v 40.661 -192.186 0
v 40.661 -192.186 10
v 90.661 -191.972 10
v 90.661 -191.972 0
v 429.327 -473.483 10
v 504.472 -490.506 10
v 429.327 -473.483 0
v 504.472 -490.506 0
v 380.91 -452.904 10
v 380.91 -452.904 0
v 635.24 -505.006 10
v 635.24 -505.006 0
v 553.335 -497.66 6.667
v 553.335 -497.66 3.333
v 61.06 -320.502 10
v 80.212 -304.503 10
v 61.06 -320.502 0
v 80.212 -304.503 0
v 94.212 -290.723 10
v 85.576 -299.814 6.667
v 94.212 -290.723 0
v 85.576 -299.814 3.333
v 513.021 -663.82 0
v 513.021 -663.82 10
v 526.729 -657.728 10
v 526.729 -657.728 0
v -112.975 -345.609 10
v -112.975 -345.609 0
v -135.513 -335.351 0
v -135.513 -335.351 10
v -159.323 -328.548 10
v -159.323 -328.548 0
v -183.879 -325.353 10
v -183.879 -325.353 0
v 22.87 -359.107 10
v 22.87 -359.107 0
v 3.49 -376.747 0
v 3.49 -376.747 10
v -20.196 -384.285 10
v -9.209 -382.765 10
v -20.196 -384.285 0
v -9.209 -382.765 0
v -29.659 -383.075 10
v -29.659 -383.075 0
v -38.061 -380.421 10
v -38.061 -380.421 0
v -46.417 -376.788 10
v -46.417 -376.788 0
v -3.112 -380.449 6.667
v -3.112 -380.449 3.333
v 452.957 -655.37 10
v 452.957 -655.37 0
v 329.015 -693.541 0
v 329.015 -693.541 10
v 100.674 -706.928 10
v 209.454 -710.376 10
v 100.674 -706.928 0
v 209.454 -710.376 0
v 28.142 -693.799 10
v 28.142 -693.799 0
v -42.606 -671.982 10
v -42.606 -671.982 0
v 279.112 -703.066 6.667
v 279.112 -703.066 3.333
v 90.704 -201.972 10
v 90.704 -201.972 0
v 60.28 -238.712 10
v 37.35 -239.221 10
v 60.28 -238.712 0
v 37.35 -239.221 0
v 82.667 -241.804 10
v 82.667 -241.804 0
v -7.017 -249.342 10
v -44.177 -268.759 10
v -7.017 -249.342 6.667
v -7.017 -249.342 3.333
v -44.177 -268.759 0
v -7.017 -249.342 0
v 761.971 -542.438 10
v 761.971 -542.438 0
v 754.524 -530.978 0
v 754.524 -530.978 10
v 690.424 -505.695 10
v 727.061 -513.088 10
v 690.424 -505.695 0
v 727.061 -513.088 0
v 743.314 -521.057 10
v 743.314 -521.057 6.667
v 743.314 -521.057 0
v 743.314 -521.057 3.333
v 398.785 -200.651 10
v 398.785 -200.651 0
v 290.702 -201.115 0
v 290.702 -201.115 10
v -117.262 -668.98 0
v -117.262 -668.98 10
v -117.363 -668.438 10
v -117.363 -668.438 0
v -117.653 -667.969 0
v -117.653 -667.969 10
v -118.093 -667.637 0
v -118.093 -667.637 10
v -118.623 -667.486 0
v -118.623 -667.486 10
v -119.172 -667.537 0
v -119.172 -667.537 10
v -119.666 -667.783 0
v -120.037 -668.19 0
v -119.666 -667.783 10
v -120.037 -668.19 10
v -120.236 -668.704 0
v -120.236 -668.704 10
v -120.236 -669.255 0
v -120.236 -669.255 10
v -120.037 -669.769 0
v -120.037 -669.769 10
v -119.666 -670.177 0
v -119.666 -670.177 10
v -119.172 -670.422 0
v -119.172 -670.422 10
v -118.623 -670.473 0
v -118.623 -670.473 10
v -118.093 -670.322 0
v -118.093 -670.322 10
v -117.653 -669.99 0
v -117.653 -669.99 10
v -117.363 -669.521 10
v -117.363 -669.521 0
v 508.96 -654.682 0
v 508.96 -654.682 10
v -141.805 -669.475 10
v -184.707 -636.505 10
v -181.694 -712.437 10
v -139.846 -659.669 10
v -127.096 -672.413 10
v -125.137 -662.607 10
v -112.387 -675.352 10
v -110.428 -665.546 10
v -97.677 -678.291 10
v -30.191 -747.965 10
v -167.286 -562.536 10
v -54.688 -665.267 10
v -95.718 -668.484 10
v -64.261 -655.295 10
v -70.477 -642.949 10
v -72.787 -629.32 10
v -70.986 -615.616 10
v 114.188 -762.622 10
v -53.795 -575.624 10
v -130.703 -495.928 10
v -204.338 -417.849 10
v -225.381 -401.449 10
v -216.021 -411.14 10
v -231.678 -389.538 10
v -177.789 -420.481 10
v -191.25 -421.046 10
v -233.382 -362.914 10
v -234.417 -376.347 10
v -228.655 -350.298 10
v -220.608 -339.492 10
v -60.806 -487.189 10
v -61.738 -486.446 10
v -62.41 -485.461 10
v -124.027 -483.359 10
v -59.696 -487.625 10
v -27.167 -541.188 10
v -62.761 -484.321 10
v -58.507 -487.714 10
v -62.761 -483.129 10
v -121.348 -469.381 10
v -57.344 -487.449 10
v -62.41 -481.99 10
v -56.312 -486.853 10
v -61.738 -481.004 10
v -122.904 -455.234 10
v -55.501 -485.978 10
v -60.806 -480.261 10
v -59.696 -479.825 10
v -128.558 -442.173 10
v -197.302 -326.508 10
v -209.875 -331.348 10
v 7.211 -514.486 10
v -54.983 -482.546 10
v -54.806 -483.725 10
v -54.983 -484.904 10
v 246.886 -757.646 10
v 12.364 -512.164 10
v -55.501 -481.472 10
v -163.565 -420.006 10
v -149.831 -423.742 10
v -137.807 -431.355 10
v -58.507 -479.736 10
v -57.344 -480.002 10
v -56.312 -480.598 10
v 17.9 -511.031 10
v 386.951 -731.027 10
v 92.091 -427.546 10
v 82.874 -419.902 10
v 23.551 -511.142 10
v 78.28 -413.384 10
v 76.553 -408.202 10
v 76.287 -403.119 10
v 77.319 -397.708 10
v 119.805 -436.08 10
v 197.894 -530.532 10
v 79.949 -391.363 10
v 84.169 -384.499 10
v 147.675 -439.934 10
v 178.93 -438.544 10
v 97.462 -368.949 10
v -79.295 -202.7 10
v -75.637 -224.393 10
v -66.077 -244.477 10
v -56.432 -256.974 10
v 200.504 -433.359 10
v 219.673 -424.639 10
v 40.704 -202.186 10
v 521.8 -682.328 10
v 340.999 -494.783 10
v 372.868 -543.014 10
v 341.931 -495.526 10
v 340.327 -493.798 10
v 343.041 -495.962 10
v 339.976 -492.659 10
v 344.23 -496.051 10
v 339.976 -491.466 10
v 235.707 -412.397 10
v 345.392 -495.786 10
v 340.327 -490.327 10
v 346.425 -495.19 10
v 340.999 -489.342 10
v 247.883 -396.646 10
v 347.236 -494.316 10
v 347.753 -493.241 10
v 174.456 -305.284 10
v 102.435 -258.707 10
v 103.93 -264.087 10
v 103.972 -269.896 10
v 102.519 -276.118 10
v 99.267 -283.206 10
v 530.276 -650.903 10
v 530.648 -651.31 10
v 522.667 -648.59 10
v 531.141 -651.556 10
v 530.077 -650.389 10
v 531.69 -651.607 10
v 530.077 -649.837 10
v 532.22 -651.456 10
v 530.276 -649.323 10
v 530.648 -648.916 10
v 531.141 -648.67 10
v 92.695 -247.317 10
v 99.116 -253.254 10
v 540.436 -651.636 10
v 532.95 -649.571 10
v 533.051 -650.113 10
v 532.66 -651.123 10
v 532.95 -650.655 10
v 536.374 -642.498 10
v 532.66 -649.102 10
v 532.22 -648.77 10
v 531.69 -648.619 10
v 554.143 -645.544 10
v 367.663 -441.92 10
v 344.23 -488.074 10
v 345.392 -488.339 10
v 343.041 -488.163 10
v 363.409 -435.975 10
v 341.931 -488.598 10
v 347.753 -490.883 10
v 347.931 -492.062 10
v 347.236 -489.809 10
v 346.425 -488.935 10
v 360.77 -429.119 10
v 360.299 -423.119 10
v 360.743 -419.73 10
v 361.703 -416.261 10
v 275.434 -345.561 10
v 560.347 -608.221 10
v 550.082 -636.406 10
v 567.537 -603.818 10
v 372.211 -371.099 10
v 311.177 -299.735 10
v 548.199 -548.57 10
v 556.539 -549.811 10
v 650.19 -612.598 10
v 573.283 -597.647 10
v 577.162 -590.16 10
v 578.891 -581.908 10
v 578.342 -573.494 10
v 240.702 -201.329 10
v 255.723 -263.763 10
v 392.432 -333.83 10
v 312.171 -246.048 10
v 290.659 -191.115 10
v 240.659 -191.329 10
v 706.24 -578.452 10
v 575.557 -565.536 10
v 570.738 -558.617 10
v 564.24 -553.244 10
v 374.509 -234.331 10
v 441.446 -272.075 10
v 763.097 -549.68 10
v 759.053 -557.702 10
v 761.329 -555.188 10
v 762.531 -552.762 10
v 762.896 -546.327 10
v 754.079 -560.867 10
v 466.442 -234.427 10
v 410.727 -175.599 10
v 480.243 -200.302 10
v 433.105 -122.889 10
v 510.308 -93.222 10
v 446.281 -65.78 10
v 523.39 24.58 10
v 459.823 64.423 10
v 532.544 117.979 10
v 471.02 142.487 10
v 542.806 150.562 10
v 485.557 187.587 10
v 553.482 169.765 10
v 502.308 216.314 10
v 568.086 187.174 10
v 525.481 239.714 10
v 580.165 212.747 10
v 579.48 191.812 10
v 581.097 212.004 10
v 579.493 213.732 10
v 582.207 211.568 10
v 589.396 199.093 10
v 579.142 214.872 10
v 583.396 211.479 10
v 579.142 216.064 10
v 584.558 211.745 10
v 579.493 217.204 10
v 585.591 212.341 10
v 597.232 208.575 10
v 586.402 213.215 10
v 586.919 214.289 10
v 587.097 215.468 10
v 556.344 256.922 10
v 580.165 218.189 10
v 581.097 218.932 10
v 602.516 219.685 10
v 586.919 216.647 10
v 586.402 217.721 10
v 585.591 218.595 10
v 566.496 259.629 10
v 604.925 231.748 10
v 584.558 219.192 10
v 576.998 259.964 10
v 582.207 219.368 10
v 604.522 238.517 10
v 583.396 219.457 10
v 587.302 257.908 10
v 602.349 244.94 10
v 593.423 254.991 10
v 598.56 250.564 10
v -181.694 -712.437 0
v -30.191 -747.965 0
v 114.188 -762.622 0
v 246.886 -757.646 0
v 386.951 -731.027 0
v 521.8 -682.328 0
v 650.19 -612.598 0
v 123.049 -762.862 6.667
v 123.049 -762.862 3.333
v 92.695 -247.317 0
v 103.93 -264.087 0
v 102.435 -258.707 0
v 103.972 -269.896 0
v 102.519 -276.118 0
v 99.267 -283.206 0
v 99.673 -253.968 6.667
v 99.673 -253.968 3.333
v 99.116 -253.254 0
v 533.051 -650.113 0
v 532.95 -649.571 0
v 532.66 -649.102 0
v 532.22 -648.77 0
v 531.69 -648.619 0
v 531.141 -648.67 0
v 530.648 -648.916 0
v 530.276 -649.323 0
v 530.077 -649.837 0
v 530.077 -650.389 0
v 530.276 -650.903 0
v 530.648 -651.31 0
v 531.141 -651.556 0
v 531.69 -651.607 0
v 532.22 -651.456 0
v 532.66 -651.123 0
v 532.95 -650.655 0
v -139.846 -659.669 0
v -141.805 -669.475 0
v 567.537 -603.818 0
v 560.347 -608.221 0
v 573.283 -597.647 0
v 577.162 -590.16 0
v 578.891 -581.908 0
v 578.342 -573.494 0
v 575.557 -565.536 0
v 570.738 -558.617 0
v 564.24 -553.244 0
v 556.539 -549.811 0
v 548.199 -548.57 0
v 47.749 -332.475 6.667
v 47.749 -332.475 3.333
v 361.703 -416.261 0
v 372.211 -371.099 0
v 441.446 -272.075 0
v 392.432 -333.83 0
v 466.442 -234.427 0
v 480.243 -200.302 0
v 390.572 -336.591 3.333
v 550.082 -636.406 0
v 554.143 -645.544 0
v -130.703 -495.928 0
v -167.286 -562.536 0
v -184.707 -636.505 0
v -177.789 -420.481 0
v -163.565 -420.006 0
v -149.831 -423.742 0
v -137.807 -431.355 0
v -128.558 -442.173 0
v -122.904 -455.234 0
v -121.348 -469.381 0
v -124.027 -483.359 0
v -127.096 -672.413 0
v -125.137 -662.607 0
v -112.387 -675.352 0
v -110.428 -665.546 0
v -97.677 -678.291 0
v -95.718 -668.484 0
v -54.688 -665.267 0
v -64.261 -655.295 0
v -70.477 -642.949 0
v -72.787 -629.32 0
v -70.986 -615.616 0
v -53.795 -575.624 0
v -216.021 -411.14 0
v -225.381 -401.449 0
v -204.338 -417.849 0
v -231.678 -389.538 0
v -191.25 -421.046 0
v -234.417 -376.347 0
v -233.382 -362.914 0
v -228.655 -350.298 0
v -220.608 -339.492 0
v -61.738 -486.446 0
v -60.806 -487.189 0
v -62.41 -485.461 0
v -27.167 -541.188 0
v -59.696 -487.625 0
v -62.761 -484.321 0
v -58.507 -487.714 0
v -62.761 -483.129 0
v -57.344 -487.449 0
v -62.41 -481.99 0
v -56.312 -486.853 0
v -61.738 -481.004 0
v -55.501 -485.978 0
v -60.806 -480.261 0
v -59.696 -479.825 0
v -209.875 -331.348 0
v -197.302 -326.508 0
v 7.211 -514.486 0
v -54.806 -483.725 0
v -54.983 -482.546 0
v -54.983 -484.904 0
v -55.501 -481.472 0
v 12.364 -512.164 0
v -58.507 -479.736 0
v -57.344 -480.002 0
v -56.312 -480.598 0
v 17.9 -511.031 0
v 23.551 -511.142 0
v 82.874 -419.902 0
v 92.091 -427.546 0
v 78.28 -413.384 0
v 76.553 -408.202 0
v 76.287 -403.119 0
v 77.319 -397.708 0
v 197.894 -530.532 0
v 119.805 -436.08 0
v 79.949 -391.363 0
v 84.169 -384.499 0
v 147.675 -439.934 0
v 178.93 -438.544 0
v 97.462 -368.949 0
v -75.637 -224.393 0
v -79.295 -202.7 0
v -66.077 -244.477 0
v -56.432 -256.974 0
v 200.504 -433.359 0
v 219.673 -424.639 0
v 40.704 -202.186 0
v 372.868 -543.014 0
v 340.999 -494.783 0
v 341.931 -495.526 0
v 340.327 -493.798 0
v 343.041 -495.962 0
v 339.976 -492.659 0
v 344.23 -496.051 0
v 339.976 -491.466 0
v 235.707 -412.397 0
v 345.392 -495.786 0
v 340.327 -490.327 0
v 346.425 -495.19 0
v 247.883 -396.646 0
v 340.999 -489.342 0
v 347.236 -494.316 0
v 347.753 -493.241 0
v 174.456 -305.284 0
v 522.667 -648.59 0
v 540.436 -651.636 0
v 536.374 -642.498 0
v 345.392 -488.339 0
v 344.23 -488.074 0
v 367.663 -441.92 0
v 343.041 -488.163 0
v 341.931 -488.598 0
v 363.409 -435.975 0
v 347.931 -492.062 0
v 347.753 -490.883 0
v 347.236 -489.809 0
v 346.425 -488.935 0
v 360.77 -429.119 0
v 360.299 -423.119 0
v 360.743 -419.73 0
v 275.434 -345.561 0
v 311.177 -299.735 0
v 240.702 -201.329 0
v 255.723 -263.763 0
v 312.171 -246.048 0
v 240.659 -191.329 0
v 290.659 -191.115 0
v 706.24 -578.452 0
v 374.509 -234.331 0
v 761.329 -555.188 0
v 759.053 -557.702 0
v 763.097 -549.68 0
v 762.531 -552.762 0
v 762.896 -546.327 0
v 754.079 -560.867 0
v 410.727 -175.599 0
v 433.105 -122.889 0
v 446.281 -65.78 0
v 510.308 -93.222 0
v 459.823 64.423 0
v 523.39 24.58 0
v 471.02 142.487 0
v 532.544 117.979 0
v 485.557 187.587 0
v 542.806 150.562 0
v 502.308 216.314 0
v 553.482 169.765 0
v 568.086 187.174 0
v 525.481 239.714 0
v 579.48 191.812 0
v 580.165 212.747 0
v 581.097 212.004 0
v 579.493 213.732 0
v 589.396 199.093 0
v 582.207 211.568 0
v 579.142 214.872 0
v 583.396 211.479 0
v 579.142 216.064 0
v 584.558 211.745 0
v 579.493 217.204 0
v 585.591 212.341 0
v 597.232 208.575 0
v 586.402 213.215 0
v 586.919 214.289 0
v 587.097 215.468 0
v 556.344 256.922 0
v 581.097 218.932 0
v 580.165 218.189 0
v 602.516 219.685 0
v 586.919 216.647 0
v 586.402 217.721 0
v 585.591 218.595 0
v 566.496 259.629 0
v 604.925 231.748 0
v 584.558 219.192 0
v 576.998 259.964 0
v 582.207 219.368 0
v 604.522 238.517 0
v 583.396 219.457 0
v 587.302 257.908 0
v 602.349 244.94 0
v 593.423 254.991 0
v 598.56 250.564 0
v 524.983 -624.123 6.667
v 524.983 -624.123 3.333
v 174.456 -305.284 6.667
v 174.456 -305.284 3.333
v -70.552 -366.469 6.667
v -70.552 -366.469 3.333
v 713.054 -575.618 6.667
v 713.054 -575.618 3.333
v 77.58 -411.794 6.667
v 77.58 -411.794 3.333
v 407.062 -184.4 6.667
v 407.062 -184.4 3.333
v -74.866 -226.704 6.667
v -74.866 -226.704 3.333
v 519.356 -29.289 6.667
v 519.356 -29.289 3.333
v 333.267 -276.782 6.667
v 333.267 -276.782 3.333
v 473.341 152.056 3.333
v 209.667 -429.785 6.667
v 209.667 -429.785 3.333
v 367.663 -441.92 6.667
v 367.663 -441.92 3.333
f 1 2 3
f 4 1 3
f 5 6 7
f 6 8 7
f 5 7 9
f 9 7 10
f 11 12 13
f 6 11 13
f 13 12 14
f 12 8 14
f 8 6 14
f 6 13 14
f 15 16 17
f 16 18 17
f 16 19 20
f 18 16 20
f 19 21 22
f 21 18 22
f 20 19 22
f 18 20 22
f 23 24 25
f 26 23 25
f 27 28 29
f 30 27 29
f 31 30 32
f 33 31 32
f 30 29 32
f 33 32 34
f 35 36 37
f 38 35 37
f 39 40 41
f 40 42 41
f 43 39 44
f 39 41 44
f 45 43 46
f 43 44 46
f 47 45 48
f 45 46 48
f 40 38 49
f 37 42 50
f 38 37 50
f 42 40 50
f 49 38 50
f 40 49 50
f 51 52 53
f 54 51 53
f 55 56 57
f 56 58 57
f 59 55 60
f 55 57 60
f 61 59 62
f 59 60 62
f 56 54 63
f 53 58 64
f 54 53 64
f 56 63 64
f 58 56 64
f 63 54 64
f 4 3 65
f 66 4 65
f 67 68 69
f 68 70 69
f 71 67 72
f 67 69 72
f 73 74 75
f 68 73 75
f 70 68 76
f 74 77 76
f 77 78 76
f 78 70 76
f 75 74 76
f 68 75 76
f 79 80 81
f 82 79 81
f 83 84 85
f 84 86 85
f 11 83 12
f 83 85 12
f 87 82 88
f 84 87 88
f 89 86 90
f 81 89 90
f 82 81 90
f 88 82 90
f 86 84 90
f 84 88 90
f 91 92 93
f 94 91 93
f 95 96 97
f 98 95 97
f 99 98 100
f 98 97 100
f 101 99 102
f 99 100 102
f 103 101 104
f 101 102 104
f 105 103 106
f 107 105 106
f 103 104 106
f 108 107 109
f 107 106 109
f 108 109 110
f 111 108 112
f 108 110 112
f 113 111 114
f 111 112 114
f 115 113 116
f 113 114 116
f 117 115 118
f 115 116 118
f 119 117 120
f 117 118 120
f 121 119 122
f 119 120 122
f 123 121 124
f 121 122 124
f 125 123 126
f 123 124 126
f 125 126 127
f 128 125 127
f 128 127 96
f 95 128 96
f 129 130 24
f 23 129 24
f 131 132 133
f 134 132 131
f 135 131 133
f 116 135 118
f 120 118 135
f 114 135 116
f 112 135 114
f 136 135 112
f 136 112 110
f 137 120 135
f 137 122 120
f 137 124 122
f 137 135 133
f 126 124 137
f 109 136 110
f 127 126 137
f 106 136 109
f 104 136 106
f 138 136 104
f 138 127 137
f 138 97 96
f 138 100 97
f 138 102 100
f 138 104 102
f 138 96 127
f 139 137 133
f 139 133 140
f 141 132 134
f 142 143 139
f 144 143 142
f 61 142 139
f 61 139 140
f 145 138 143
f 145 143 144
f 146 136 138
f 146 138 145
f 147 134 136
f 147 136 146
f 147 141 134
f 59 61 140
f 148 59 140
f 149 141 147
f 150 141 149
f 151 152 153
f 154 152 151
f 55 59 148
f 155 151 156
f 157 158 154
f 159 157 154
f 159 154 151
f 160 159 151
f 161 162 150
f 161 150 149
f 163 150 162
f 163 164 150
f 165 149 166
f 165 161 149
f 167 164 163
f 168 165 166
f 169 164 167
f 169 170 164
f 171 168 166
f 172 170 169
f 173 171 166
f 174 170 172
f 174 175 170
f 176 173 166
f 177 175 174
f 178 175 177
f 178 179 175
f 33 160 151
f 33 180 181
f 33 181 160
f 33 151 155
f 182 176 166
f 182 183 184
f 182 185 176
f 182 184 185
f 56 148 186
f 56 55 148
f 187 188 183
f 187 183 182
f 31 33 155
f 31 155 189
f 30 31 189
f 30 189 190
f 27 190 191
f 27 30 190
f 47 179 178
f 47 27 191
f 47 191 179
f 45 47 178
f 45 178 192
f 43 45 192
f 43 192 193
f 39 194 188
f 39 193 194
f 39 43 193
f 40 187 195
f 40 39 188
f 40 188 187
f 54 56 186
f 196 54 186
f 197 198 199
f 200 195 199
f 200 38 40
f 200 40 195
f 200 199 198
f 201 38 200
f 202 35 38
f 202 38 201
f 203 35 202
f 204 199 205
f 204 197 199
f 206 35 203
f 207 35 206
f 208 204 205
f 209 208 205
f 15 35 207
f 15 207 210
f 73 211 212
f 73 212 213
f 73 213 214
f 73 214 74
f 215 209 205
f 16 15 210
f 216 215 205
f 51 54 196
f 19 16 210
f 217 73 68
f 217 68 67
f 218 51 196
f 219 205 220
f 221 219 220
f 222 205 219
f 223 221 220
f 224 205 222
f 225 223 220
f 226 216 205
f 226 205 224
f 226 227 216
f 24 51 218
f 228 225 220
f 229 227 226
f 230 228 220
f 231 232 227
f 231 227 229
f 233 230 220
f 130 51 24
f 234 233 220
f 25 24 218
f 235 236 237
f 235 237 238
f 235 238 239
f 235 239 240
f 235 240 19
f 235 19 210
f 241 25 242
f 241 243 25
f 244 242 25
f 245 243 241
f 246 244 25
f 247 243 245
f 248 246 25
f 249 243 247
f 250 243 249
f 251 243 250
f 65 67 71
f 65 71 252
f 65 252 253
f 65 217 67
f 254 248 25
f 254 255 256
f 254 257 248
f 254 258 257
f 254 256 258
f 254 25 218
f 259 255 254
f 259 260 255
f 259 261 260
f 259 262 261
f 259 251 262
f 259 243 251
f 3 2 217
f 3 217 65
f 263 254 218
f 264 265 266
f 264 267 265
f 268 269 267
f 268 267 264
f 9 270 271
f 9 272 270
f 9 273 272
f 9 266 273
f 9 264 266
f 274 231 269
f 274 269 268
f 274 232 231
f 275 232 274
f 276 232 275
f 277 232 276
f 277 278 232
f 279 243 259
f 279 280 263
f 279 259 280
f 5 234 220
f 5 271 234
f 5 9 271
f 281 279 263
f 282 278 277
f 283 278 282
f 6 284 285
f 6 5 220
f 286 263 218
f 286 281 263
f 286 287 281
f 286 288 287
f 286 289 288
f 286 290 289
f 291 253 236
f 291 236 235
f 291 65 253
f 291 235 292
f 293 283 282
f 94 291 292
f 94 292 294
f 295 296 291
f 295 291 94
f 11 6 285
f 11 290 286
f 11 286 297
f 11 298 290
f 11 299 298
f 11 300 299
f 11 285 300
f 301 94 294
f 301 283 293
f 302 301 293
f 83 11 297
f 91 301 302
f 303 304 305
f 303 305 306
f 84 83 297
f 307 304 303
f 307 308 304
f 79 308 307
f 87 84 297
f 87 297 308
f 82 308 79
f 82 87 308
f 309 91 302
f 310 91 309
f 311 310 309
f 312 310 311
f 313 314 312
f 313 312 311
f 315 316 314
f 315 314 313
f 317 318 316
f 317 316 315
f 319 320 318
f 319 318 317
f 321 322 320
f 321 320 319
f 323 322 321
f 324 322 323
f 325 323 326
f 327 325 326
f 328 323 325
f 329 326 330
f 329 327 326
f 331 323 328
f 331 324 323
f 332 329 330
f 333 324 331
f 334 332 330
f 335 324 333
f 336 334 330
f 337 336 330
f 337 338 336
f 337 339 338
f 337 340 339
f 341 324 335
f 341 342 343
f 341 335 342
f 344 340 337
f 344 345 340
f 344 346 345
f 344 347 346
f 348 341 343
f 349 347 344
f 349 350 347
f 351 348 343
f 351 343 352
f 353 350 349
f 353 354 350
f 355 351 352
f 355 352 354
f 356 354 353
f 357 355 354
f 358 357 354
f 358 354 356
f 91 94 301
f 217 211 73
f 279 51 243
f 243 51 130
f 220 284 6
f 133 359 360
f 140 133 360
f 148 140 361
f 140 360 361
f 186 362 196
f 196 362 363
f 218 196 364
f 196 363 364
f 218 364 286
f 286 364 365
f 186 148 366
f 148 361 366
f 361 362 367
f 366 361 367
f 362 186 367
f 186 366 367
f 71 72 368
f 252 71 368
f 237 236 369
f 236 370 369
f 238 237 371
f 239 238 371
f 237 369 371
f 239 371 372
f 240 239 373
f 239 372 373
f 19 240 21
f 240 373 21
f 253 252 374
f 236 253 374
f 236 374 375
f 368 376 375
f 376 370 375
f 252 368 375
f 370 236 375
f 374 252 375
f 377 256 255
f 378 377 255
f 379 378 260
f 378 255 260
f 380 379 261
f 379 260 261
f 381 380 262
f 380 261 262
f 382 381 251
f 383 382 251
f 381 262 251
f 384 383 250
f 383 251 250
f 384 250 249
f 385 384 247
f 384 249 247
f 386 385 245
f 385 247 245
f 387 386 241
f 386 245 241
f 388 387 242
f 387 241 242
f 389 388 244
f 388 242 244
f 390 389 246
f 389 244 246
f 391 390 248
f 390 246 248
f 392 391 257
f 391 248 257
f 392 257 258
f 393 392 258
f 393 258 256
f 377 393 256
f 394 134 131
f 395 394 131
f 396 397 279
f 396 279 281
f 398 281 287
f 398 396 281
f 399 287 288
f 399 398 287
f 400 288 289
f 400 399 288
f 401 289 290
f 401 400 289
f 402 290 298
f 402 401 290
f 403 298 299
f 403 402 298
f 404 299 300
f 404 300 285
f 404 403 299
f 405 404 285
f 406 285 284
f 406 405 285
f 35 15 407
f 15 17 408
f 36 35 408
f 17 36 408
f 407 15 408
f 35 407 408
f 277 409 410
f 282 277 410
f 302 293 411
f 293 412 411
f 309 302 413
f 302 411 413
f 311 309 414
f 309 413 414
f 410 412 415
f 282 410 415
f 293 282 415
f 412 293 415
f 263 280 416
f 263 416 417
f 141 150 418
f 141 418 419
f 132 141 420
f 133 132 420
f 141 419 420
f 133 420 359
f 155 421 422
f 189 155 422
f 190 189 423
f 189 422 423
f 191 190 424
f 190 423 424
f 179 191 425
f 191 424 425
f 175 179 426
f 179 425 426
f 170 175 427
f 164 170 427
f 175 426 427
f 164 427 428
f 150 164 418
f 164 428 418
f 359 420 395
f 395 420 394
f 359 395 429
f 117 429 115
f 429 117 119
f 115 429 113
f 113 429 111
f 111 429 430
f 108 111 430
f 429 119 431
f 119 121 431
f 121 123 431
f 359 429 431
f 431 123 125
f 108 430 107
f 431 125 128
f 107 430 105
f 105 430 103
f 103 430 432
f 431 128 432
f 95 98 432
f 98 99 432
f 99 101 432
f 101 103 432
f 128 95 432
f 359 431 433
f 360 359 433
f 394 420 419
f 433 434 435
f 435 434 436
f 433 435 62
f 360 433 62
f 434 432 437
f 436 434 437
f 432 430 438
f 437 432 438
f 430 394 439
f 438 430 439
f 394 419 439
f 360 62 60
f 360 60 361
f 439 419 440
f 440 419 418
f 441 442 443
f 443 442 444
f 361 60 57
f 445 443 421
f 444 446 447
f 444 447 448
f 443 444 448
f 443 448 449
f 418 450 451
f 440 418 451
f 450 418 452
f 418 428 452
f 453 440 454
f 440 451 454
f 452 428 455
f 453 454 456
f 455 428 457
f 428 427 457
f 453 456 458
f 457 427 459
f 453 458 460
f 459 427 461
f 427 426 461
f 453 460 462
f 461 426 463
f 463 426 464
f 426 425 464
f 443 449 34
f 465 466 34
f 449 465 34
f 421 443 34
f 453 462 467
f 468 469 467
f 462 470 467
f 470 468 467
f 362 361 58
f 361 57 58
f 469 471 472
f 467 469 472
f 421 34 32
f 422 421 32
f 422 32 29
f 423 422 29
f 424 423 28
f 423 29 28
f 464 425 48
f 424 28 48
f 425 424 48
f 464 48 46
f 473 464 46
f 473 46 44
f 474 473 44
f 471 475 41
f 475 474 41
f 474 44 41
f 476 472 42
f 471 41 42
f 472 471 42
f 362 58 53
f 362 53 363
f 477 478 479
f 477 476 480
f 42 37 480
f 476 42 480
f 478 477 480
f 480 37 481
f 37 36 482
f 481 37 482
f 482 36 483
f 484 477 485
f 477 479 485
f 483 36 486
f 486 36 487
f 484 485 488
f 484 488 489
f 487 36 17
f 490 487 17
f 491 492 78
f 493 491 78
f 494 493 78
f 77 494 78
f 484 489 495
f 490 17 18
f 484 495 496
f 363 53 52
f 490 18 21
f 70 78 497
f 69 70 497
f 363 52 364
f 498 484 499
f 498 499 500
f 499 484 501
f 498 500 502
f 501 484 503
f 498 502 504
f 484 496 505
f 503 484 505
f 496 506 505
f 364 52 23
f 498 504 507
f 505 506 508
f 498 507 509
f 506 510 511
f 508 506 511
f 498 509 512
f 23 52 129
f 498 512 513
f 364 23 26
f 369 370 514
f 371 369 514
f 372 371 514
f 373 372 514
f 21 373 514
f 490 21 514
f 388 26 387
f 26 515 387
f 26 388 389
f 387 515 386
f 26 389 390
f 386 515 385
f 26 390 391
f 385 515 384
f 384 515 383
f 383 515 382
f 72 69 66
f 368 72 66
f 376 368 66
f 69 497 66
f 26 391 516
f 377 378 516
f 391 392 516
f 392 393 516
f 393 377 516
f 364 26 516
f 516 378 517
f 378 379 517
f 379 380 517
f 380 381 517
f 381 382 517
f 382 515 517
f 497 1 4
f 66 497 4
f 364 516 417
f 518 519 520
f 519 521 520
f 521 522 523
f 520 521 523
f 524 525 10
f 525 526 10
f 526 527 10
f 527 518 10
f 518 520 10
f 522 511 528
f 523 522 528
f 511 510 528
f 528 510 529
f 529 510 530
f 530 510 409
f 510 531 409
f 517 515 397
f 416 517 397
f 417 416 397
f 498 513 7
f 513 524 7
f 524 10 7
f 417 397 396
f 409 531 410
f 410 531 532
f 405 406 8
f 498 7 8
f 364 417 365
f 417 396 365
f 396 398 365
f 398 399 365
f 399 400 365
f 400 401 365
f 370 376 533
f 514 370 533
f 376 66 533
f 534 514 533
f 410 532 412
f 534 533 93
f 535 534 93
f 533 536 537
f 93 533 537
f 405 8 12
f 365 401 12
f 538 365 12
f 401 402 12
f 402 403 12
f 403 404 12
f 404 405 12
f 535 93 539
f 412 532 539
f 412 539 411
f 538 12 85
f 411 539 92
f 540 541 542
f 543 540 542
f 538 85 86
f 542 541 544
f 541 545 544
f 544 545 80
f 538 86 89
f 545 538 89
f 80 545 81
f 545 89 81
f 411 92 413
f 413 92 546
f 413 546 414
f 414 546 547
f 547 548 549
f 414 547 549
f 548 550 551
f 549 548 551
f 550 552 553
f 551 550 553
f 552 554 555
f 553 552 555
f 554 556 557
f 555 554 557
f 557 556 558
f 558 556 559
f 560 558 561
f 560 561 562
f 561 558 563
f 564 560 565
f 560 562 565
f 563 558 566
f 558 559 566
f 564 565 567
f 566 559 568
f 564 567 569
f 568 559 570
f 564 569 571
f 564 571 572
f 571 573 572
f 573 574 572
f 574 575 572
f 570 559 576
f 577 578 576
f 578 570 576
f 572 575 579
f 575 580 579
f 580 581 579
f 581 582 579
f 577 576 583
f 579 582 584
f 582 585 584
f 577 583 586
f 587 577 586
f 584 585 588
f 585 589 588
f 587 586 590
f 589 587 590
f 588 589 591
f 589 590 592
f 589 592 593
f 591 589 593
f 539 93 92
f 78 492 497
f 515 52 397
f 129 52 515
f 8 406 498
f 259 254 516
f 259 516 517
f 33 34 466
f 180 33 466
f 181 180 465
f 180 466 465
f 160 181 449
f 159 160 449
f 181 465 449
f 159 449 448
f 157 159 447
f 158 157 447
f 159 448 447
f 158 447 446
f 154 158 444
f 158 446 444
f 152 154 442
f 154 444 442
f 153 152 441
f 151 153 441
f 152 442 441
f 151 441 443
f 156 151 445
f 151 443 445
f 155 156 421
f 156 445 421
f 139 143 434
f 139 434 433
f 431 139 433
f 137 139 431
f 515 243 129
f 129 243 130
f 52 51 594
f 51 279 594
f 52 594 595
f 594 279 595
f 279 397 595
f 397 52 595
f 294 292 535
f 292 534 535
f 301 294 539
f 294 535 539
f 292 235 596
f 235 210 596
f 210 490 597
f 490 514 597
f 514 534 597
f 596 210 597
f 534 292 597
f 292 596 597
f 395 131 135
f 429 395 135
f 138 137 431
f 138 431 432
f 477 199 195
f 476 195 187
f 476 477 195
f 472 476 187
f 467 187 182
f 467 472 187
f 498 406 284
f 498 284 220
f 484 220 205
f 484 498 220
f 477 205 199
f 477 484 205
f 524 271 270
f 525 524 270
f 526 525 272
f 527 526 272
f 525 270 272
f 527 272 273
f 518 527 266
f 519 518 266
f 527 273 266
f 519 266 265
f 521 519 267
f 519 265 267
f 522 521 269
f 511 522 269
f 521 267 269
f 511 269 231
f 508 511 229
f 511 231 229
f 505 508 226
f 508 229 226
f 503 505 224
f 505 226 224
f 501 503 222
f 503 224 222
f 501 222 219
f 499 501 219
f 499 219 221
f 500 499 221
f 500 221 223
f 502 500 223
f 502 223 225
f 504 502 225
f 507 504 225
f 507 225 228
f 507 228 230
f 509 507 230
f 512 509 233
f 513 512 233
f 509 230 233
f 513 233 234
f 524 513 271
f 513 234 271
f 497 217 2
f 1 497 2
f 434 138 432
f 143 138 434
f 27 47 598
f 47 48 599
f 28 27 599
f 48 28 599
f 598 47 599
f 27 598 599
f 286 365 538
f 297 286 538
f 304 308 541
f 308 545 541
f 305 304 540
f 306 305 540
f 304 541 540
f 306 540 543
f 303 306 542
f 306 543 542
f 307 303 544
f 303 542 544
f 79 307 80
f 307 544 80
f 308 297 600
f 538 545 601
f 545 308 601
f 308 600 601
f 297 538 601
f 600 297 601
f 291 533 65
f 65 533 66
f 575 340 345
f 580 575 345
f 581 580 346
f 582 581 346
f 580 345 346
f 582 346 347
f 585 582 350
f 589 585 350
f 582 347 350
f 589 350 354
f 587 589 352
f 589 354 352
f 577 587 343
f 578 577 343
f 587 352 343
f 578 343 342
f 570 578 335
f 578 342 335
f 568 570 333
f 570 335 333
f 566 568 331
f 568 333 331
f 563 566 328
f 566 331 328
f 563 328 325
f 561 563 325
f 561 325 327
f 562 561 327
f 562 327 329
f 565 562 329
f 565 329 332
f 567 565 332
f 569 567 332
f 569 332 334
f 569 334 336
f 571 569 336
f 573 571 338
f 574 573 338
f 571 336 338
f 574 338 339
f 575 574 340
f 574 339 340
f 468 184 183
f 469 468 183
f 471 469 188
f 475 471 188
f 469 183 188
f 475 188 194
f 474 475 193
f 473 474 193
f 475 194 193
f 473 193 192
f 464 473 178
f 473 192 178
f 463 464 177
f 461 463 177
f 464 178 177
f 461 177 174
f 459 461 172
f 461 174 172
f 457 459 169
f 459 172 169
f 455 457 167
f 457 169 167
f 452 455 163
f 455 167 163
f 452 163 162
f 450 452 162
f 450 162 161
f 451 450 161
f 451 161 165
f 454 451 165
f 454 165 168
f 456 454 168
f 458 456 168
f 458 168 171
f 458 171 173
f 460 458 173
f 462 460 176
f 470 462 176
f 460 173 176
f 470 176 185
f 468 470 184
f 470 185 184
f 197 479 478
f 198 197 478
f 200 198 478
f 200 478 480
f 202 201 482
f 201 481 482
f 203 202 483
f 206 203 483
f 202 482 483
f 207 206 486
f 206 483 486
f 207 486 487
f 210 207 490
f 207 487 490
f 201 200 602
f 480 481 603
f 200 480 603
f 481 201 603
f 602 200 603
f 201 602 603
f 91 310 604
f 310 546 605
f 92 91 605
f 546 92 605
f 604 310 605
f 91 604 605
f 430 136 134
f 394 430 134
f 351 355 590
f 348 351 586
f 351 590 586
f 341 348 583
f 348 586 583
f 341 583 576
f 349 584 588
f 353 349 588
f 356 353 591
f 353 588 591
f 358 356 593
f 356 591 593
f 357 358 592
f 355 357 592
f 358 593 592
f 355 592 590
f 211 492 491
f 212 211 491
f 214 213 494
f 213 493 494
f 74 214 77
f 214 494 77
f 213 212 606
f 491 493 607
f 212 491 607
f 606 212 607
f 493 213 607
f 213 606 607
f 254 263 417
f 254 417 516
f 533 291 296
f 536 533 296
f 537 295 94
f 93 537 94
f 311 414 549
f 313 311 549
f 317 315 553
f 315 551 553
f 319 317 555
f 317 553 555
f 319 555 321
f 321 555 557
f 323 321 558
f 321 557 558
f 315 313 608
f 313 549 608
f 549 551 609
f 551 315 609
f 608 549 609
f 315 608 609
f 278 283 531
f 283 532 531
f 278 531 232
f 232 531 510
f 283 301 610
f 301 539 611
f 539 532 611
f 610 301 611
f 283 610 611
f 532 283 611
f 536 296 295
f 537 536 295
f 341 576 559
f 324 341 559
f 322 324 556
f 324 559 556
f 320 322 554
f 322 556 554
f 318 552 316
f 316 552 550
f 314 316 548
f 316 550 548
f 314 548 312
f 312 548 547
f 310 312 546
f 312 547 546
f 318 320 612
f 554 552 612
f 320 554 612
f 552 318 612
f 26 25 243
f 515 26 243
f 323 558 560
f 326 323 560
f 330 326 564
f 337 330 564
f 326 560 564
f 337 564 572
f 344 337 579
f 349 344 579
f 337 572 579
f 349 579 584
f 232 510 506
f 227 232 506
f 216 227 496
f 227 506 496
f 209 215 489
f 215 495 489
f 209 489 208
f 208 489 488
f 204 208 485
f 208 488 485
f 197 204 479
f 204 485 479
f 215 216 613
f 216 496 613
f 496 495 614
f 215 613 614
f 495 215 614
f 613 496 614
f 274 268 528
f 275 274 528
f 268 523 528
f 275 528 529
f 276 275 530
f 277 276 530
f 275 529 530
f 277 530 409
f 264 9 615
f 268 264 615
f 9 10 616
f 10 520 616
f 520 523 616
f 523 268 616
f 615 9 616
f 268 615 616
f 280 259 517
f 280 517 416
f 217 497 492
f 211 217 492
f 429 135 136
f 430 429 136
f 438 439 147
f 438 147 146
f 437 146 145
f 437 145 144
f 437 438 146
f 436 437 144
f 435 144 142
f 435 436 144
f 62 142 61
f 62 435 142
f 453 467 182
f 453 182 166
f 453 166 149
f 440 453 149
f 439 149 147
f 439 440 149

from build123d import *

# Parameters (mm, degrees)
EXTRUDE_3344_DEPTH     = 10
EXTRUDE_7001_DEPTH     = 10
CUT_EXTRUDE_7885_REACH = 1081.252
SKETCH6_R              = 1.5
SKETCH10_R             = 4
CUT_EXTRUDE2_DEPTH     = 10


with BuildPart() as part:
    # Sketch 366 → Extrude 3344 (new body)
    with BuildSketch(Plane.XY):
        with BuildLine():
            Line((398.785011417, -200.651493516), (-79.294784876, -202.700029576))
            add(Edge.make_bspline(
                [(-79.294784876, -202.700029576), (-78.517207033, -227.700030074), (-66.77413567, -249.709423293), (-44.177194857, -268.758733778)],
                knots=[0.130434783, 0.130434783, 0.130434783, 0.130434783, 0.173913043, 0.173913043, 0.173913043, 0.173913043], degree=3))
            add(Edge.make_bspline(
                [(-44.177194857, -268.758733778), (-12.705791537, -245.829015584), (38.959692419, -231.734357298), (82.666649693, -241.803965427)],
                knots=[0.173913043, 0.173913043, 0.173913043, 0.173913043, 0.217391304, 0.217391304, 0.217391304, 0.217391304], degree=3))
            add(Edge.make_bspline(
                [(82.666649693, -241.803965427), (105.678664452, -251.652519997), (111.246401119, -268.691898993), (94.211511027, -290.72343747)],
                knots=[0.217391304, 0.217391304, 0.217391304, 0.217391304, 0.260869565, 0.260869565, 0.260869565, 0.260869565], degree=3))
            add(Edge.make_bspline(
                [(94.211511027, -290.72343747), (87.158146802, -299.84568745), (74.983143168, -308.421687748), (61.059861243, -320.502125148)],
                knots=[0.260869565, 0.260869565, 0.260869565, 0.260869565, 0.304347826, 0.304347826, 0.304347826, 0.304347826], degree=3))
            add(Edge.make_bspline(
                [(61.059861243, -320.502125148), (47.380576162, -331.841195194), (34.883169502, -345.267804883), (22.870464668, -359.106695422)],
                knots=[0.304347826, 0.304347826, 0.304347826, 0.304347826, 0.347826087, 0.347826087, 0.347826087, 0.347826087], degree=3))
            add(Edge.make_bspline(
                [(22.870464668, -359.106695422), (-5.584395486, -391.889656597), (-25.592236503, -386.636342684), (-46.417157713, -376.787588607)],
                knots=[0.347826087, 0.347826087, 0.347826087, 0.347826087, 0.391304348, 0.391304348, 0.391304348, 0.391304348], degree=3))
            add(Edge.make_bspline(
                [(-46.417157713, -376.787588607), (-71.990241561, -366.221906762), (-92.784039707, -356.68149048), (-112.974728727, -345.609360564)],
                knots=[0.391304348, 0.391304348, 0.391304348, 0.391304348, 0.434782609, 0.434782609, 0.434782609, 0.434782609], degree=3))
            ThreePointArc((-112.974728727, -345.609360564), (-147.291018167, -331.50605668), (-183.878601839, -325.353039337))
            ThreePointArc((-183.878601839, -325.353039337), (-234.41691777, -376.347060605), (-177.788935429, -420.480757462))
            ThreePointArc((-177.788935429, -420.480757462), (-128.557787466, -442.172804122), (-130.703269603, -495.928247794))
            ThreePointArc((-130.703269603, -495.928247794), (-178.505297895, -598.929354982), (-181.694355183, -712.437468808))
            add(Edge.make_bspline(
                [(-181.694355183, -712.437468808), (138.462224148, -807.731703363), (410.691079854, -765.39904884), (650.190442214, -612.598169561)],
                knots=[0.652173913, 0.652173913, 0.652173913, 0.652173913, 0.695652174, 0.695652174, 0.695652174, 0.695652174], degree=3))
            add(Edge.make_bspline(
                [(650.190442214, -612.598169561), (721.726306985, -555.13661338), (771.374178439, -572.802842814), (761.971022851, -542.438303349)],
                knots=[0.695652174, 0.695652174, 0.695652174, 0.695652174, 0.739130435, 0.739130435, 0.739130435, 0.739130435], degree=3))
            add(Edge.make_bspline(
                [(761.971022851, -542.438303349), (749.988144288, -518.251093648), (723.103402832, -500.836242812), (635.239899657, -505.006434182)],
                knots=[0.739130435, 0.739130435, 0.739130435, 0.739130435, 0.782608696, 0.782608696, 0.782608696, 0.782608696], degree=3))
            add(Edge.make_bspline(
                [(635.239899657, -505.006434182), (572.991975282, -501.932832065), (433.550272387, -486.778792548), (380.910397107, -452.903731023)],
                knots=[0.782608696, 0.782608696, 0.782608696, 0.782608696, 0.826086957, 0.826086957, 0.826086957, 0.826086957], degree=3))
            add(Edge.make_bspline(
                [(380.910397107, -452.903731023), (364.765905966, -442.514313456), (356.786231562, -430.363849161), (361.702578451, -416.260911342)],
                knots=[0.826086957, 0.826086957, 0.826086957, 0.826086957, 0.869565217, 0.869565217, 0.869565217, 0.869565217], degree=3))
            add(Edge.make_bspline(
                [(361.702578451, -416.260911342), (369.757666434, -319.561849491), (455.747401527, -287.137003064), (480.242749516, -200.302456329)],
                knots=[0.869565217, 0.869565217, 0.869565217, 0.869565217, 0.913043478, 0.913043478, 0.913043478, 0.913043478], degree=3))
            add(Edge.make_bspline(
                [(480.242749516, -200.302456329), (553.544349425, -5.601453319), (495.010045056, 115.276837959), (568.085803242, 187.174308847)],
                knots=[0.913043478, 0.913043478, 0.913043478, 0.913043478, 0.956521739, 0.956521739, 0.956521739, 0.956521739], degree=3))
            ThreePointArc((568.085803242, 187.174308847), (593.606841589, 203.592061702), (604.925253944, 231.748047725))
            ThreePointArc((604.925253944, 231.748047725), (600.64196866, 247.878688747), (587.30163028, 257.907621119))
            ThreePointArc((587.30163028, 257.907621119), (571.737485415, 260.097118561), (556.344046154, 256.922448156))
            add(Edge.make_bspline(
                [(556.344046154, 256.922448156), (413.493143177, 200.699964154), (492.80385804, -30.446360595), (410.726691822, -175.599321984)],
                knots=[0.000400641, 0.000400641, 0.000400641, 0.000400641, 0.043478261, 0.043478261, 0.043478261, 0.043478261], degree=3))
            add(Edge.make_bspline(
                [(410.726691822, -175.599321984), (407.231033021, -184.649150987), (403.219250068, -192.928185379), (398.785011417, -200.651493516)],
                knots=[0.043478261, 0.043478261, 0.043478261, 0.043478261, 0.086956522, 0.086956522, 0.086956522, 0.086956522], degree=3))
        make_face()
        with BuildLine():
            ThreePointArc((560.346734066, -608.221488629), (578.34219742, -573.494082411), (548.198906447, -548.569968521))
            ThreePointArc((548.198906447, -548.569968521), (285.319700334, -537.637629059), (23.550736383, -511.142298049))
            ThreePointArc((23.550736383, -511.142298049), (15.100477301, -511.443853236), (7.211162456, -514.486307076))
            ThreePointArc((7.211162456, -514.486307076), (-41.568101768, -557.565567627), (-70.986403303, -615.615570579))
            ThreePointArc((-70.986403303, -615.615570579), (-67.830334276, -649.354197638), (-42.606278131, -671.981674723))
            add(Edge.make_bspline(
                [(452.957398359, -655.370237863), (274.711219353, -724.494962923), (109.739326577, -728.980973594), (-42.606278131, -671.981674723)],
                knots=[0.555555556, 0.555555556, 0.555555556, 0.555555556, 0.666666667, 0.666666667, 0.666666667, 0.666666667], degree=3))
            add(Edge.make_bspline(
                [(560.346734066, -608.221488629), (524.550322081, -623.937738374), (490.70019891, -640.488126146), (452.957398359, -655.370237863)],
                knots=[0.444444444, 0.444444444, 0.444444444, 0.444444444, 0.555555556, 0.555555556, 0.555555556, 0.555555556], degree=3))
        make_face(mode=Mode.SUBTRACT)
        with BuildLine():
            add(Edge.make_bspline(
                [(97.461776435, -368.948566513), (168.620673064, -296.351125936), (255.441952596, -250.089184531), (374.508522413, -234.330838847)],
                knots=[0.75, 0.75, 0.75, 0.75, 1, 1, 1, 1], degree=3))
            add(Edge.make_bspline(
                [(374.508522413, -234.330838847), (336.704373514, -278.003480948), (285.636212987, -310.964302456), (247.882738821, -396.645799506)],
                knots=[0, 0, 0, 0, 0.25, 0.25, 0.25, 0.25], degree=3))
            add(Edge.make_bspline(
                [(247.882738821, -396.645799506), (222.475445143, -441.097914765), (152.691350033, -451.719558275), (92.090753497, -427.546413805)],
                knots=[0.25, 0.25, 0.25, 0.25, 0.5, 0.5, 0.5, 0.5], degree=3))
            add(Edge.make_bspline(
                [(92.090753497, -427.546413805), (69.794668972, -412.531131284), (70.490548771, -396.456667038), (97.461776435, -368.948566513)],
                knots=[0.5, 0.5, 0.5, 0.5, 0.75, 0.75, 0.75, 0.75], degree=3))
        make_face(mode=Mode.SUBTRACT)
    extrude(amount=EXTRUDE_3344_DEPTH)

    # Sketch5 → Extrude 7001 (add)
    with BuildSketch(Plane.XY.offset(10)):
        Polygon((40.661264648, -192.185935101), (90.66080564, -191.971690819), (90.703654496, -201.971599017), (40.704113505, -202.185843299), align=None)
        Polygon((240.659428615, -191.328957973), (290.658969607, -191.114713691), (290.701818463, -201.114621889), (240.702277472, -201.328866171), align=None)
    extrude(amount=-EXTRUDE_7001_DEPTH)

    # Sketch6 → Cut-Extrude 7885 (cut, up to next)
    with BuildSketch(Plane.XY.offset(10), mode=Mode.PRIVATE) as cut_extrude_7885_sk1:
        with Locations((531.551481114, -650.112952006)):
            Circle(SKETCH6_R)
    cut_extrude_7885_tool1 = extrude(cut_extrude_7885_sk1.sketch, amount=-CUT_EXTRUDE_7885_REACH, mode=Mode.PRIVATE) & part.part
    # Sketch6 → Cut-Extrude 7885 (cut, up to next)
    with BuildSketch(Plane.XY.offset(10), mode=Mode.PRIVATE) as cut_extrude_7885_sk2:
        with Locations((-118.7617531, -668.979567573)):
            Circle(SKETCH6_R)
    cut_extrude_7885_tool2 = extrude(cut_extrude_7885_sk2.sketch, amount=-CUT_EXTRUDE_7885_REACH, mode=Mode.PRIVATE) & part.part
    # Sketch6 → Cut-Extrude 7885 (cut, up to next)
    with BuildSketch(Plane.XY.offset(10), mode=Mode.PRIVATE) as cut_extrude_7885_sk3:
        Polygon((-139.846242547, -659.668589925), (-141.805292897, -669.474818645), (-127.095949816, -672.413394171), (-125.136899465, -662.60716545), align=None)
    cut_extrude_7885_tool3 = extrude(cut_extrude_7885_sk3.sketch, amount=-CUT_EXTRUDE_7885_REACH, mode=Mode.PRIVATE) & part.part
    # Sketch6 → Cut-Extrude 7885 (cut, up to next)
    with BuildSketch(Plane.XY.offset(10), mode=Mode.PRIVATE) as cut_extrude_7885_sk4:
        Polygon((-112.386606734, -675.351969696), (-110.427556384, -665.545740975), (-95.718213303, -668.4843165), (-97.677263653, -678.290545221), align=None)
    cut_extrude_7885_tool4 = extrude(cut_extrude_7885_sk4.sketch, amount=-CUT_EXTRUDE_7885_REACH, mode=Mode.PRIVATE) & part.part
    # Sketch6 → Cut-Extrude 7885 (cut, up to next)
    with BuildSketch(Plane.XY.offset(10), mode=Mode.PRIVATE) as cut_extrude_7885_sk5:
        Polygon((554.142933289, -645.543894263), (540.435760059, -651.635971254), (536.374375399, -642.497855768), (550.081548628, -636.405778777), align=None)
    cut_extrude_7885_tool5 = extrude(cut_extrude_7885_sk5.sketch, amount=-CUT_EXTRUDE_7885_REACH, mode=Mode.PRIVATE) & part.part
    # Sketch6 → Cut-Extrude 7885 (cut, up to next)
    with BuildSketch(Plane.XY.offset(10), mode=Mode.PRIVATE) as cut_extrude_7885_sk6:
        Polygon((522.667202169, -648.589932758), (508.96002894, -654.682009749), (513.021413601, -663.820125235), (526.72858683, -657.728048245), align=None)
    cut_extrude_7885_tool6 = extrude(cut_extrude_7885_sk6.sketch, amount=-CUT_EXTRUDE_7885_REACH, mode=Mode.PRIVATE) & part.part
    add(cut_extrude_7885_tool1.solids().sort_by_distance((531.551481, -650.112952, 10))[0], mode=Mode.SUBTRACT)
    add(cut_extrude_7885_tool2.solids().sort_by_distance((-118.761753, -668.979568, 10))[0], mode=Mode.SUBTRACT)
    add(cut_extrude_7885_tool3.solids().sort_by_distance((-133.471096, -666.040992, 10))[0], mode=Mode.SUBTRACT)
    add(cut_extrude_7885_tool4.solids().sort_by_distance((-104.05241, -671.918143, 10))[0], mode=Mode.SUBTRACT)
    add(cut_extrude_7885_tool5.solids().sort_by_distance((545.258654, -644.020875, 10))[0], mode=Mode.SUBTRACT)
    add(cut_extrude_7885_tool6.solids().sort_by_distance((517.844308, -656.205029, 10))[0], mode=Mode.SUBTRACT)

    # Sketch10 → Cut-Extrude2 (cut)
    with BuildSketch(Plane.XY.offset(10)):
        with Locations((-58.805785282, -483.725185308)):
            Circle(SKETCH10_R)
        with Locations((343.930985097, -492.062373655)):
            Circle(SKETCH10_R)
        with Locations((583.096913772, 215.46802458)):
            Circle(SKETCH10_R)
    extrude(amount=-CUT_EXTRUDE2_DEPTH, mode=Mode.SUBTRACT)


solid = part.part
